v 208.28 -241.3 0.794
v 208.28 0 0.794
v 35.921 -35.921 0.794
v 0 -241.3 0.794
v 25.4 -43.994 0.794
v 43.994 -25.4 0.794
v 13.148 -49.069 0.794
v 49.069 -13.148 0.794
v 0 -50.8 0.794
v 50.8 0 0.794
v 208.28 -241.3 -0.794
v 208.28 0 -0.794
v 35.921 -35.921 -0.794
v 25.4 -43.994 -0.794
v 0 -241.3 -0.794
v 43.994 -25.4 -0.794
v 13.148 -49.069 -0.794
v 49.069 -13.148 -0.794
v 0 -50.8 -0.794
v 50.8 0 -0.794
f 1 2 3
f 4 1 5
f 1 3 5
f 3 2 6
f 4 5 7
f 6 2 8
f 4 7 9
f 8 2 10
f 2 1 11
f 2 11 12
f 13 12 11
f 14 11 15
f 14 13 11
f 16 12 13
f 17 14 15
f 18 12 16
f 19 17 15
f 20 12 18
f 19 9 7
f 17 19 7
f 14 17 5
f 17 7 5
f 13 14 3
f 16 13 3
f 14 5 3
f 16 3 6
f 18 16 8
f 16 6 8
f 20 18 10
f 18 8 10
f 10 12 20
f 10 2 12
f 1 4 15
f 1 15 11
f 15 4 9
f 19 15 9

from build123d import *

# Parameters (mm, degrees)
SKETCH2_W           = 25.4
SKETCH2_H           = 241.3
BOSS_EXTRUDE1_DEPTH = 0.79375


with BuildPart() as part:
    # Sketch2 → Boss-Extrude1 (new, symmetric)
    with BuildSketch(Plane.XY):
        with BuildLine():
            ThreePointArc((0, -50.8), (35.921024484, -35.921024484), (50.8, 0))
            Line((50.8, 0), (182.88, 0))
            Line((182.88, 0), (182.88, -241.3))
            Line((182.88, -241.3), (0, -241.3))
            Line((0, -241.3), (0, -50.8))
        make_face()
        with Locations((195.58, -120.65)):
            Rectangle(SKETCH2_W, SKETCH2_H)
    extrude(amount=BOSS_EXTRUDE1_DEPTH, both=True)


solid = part.part
